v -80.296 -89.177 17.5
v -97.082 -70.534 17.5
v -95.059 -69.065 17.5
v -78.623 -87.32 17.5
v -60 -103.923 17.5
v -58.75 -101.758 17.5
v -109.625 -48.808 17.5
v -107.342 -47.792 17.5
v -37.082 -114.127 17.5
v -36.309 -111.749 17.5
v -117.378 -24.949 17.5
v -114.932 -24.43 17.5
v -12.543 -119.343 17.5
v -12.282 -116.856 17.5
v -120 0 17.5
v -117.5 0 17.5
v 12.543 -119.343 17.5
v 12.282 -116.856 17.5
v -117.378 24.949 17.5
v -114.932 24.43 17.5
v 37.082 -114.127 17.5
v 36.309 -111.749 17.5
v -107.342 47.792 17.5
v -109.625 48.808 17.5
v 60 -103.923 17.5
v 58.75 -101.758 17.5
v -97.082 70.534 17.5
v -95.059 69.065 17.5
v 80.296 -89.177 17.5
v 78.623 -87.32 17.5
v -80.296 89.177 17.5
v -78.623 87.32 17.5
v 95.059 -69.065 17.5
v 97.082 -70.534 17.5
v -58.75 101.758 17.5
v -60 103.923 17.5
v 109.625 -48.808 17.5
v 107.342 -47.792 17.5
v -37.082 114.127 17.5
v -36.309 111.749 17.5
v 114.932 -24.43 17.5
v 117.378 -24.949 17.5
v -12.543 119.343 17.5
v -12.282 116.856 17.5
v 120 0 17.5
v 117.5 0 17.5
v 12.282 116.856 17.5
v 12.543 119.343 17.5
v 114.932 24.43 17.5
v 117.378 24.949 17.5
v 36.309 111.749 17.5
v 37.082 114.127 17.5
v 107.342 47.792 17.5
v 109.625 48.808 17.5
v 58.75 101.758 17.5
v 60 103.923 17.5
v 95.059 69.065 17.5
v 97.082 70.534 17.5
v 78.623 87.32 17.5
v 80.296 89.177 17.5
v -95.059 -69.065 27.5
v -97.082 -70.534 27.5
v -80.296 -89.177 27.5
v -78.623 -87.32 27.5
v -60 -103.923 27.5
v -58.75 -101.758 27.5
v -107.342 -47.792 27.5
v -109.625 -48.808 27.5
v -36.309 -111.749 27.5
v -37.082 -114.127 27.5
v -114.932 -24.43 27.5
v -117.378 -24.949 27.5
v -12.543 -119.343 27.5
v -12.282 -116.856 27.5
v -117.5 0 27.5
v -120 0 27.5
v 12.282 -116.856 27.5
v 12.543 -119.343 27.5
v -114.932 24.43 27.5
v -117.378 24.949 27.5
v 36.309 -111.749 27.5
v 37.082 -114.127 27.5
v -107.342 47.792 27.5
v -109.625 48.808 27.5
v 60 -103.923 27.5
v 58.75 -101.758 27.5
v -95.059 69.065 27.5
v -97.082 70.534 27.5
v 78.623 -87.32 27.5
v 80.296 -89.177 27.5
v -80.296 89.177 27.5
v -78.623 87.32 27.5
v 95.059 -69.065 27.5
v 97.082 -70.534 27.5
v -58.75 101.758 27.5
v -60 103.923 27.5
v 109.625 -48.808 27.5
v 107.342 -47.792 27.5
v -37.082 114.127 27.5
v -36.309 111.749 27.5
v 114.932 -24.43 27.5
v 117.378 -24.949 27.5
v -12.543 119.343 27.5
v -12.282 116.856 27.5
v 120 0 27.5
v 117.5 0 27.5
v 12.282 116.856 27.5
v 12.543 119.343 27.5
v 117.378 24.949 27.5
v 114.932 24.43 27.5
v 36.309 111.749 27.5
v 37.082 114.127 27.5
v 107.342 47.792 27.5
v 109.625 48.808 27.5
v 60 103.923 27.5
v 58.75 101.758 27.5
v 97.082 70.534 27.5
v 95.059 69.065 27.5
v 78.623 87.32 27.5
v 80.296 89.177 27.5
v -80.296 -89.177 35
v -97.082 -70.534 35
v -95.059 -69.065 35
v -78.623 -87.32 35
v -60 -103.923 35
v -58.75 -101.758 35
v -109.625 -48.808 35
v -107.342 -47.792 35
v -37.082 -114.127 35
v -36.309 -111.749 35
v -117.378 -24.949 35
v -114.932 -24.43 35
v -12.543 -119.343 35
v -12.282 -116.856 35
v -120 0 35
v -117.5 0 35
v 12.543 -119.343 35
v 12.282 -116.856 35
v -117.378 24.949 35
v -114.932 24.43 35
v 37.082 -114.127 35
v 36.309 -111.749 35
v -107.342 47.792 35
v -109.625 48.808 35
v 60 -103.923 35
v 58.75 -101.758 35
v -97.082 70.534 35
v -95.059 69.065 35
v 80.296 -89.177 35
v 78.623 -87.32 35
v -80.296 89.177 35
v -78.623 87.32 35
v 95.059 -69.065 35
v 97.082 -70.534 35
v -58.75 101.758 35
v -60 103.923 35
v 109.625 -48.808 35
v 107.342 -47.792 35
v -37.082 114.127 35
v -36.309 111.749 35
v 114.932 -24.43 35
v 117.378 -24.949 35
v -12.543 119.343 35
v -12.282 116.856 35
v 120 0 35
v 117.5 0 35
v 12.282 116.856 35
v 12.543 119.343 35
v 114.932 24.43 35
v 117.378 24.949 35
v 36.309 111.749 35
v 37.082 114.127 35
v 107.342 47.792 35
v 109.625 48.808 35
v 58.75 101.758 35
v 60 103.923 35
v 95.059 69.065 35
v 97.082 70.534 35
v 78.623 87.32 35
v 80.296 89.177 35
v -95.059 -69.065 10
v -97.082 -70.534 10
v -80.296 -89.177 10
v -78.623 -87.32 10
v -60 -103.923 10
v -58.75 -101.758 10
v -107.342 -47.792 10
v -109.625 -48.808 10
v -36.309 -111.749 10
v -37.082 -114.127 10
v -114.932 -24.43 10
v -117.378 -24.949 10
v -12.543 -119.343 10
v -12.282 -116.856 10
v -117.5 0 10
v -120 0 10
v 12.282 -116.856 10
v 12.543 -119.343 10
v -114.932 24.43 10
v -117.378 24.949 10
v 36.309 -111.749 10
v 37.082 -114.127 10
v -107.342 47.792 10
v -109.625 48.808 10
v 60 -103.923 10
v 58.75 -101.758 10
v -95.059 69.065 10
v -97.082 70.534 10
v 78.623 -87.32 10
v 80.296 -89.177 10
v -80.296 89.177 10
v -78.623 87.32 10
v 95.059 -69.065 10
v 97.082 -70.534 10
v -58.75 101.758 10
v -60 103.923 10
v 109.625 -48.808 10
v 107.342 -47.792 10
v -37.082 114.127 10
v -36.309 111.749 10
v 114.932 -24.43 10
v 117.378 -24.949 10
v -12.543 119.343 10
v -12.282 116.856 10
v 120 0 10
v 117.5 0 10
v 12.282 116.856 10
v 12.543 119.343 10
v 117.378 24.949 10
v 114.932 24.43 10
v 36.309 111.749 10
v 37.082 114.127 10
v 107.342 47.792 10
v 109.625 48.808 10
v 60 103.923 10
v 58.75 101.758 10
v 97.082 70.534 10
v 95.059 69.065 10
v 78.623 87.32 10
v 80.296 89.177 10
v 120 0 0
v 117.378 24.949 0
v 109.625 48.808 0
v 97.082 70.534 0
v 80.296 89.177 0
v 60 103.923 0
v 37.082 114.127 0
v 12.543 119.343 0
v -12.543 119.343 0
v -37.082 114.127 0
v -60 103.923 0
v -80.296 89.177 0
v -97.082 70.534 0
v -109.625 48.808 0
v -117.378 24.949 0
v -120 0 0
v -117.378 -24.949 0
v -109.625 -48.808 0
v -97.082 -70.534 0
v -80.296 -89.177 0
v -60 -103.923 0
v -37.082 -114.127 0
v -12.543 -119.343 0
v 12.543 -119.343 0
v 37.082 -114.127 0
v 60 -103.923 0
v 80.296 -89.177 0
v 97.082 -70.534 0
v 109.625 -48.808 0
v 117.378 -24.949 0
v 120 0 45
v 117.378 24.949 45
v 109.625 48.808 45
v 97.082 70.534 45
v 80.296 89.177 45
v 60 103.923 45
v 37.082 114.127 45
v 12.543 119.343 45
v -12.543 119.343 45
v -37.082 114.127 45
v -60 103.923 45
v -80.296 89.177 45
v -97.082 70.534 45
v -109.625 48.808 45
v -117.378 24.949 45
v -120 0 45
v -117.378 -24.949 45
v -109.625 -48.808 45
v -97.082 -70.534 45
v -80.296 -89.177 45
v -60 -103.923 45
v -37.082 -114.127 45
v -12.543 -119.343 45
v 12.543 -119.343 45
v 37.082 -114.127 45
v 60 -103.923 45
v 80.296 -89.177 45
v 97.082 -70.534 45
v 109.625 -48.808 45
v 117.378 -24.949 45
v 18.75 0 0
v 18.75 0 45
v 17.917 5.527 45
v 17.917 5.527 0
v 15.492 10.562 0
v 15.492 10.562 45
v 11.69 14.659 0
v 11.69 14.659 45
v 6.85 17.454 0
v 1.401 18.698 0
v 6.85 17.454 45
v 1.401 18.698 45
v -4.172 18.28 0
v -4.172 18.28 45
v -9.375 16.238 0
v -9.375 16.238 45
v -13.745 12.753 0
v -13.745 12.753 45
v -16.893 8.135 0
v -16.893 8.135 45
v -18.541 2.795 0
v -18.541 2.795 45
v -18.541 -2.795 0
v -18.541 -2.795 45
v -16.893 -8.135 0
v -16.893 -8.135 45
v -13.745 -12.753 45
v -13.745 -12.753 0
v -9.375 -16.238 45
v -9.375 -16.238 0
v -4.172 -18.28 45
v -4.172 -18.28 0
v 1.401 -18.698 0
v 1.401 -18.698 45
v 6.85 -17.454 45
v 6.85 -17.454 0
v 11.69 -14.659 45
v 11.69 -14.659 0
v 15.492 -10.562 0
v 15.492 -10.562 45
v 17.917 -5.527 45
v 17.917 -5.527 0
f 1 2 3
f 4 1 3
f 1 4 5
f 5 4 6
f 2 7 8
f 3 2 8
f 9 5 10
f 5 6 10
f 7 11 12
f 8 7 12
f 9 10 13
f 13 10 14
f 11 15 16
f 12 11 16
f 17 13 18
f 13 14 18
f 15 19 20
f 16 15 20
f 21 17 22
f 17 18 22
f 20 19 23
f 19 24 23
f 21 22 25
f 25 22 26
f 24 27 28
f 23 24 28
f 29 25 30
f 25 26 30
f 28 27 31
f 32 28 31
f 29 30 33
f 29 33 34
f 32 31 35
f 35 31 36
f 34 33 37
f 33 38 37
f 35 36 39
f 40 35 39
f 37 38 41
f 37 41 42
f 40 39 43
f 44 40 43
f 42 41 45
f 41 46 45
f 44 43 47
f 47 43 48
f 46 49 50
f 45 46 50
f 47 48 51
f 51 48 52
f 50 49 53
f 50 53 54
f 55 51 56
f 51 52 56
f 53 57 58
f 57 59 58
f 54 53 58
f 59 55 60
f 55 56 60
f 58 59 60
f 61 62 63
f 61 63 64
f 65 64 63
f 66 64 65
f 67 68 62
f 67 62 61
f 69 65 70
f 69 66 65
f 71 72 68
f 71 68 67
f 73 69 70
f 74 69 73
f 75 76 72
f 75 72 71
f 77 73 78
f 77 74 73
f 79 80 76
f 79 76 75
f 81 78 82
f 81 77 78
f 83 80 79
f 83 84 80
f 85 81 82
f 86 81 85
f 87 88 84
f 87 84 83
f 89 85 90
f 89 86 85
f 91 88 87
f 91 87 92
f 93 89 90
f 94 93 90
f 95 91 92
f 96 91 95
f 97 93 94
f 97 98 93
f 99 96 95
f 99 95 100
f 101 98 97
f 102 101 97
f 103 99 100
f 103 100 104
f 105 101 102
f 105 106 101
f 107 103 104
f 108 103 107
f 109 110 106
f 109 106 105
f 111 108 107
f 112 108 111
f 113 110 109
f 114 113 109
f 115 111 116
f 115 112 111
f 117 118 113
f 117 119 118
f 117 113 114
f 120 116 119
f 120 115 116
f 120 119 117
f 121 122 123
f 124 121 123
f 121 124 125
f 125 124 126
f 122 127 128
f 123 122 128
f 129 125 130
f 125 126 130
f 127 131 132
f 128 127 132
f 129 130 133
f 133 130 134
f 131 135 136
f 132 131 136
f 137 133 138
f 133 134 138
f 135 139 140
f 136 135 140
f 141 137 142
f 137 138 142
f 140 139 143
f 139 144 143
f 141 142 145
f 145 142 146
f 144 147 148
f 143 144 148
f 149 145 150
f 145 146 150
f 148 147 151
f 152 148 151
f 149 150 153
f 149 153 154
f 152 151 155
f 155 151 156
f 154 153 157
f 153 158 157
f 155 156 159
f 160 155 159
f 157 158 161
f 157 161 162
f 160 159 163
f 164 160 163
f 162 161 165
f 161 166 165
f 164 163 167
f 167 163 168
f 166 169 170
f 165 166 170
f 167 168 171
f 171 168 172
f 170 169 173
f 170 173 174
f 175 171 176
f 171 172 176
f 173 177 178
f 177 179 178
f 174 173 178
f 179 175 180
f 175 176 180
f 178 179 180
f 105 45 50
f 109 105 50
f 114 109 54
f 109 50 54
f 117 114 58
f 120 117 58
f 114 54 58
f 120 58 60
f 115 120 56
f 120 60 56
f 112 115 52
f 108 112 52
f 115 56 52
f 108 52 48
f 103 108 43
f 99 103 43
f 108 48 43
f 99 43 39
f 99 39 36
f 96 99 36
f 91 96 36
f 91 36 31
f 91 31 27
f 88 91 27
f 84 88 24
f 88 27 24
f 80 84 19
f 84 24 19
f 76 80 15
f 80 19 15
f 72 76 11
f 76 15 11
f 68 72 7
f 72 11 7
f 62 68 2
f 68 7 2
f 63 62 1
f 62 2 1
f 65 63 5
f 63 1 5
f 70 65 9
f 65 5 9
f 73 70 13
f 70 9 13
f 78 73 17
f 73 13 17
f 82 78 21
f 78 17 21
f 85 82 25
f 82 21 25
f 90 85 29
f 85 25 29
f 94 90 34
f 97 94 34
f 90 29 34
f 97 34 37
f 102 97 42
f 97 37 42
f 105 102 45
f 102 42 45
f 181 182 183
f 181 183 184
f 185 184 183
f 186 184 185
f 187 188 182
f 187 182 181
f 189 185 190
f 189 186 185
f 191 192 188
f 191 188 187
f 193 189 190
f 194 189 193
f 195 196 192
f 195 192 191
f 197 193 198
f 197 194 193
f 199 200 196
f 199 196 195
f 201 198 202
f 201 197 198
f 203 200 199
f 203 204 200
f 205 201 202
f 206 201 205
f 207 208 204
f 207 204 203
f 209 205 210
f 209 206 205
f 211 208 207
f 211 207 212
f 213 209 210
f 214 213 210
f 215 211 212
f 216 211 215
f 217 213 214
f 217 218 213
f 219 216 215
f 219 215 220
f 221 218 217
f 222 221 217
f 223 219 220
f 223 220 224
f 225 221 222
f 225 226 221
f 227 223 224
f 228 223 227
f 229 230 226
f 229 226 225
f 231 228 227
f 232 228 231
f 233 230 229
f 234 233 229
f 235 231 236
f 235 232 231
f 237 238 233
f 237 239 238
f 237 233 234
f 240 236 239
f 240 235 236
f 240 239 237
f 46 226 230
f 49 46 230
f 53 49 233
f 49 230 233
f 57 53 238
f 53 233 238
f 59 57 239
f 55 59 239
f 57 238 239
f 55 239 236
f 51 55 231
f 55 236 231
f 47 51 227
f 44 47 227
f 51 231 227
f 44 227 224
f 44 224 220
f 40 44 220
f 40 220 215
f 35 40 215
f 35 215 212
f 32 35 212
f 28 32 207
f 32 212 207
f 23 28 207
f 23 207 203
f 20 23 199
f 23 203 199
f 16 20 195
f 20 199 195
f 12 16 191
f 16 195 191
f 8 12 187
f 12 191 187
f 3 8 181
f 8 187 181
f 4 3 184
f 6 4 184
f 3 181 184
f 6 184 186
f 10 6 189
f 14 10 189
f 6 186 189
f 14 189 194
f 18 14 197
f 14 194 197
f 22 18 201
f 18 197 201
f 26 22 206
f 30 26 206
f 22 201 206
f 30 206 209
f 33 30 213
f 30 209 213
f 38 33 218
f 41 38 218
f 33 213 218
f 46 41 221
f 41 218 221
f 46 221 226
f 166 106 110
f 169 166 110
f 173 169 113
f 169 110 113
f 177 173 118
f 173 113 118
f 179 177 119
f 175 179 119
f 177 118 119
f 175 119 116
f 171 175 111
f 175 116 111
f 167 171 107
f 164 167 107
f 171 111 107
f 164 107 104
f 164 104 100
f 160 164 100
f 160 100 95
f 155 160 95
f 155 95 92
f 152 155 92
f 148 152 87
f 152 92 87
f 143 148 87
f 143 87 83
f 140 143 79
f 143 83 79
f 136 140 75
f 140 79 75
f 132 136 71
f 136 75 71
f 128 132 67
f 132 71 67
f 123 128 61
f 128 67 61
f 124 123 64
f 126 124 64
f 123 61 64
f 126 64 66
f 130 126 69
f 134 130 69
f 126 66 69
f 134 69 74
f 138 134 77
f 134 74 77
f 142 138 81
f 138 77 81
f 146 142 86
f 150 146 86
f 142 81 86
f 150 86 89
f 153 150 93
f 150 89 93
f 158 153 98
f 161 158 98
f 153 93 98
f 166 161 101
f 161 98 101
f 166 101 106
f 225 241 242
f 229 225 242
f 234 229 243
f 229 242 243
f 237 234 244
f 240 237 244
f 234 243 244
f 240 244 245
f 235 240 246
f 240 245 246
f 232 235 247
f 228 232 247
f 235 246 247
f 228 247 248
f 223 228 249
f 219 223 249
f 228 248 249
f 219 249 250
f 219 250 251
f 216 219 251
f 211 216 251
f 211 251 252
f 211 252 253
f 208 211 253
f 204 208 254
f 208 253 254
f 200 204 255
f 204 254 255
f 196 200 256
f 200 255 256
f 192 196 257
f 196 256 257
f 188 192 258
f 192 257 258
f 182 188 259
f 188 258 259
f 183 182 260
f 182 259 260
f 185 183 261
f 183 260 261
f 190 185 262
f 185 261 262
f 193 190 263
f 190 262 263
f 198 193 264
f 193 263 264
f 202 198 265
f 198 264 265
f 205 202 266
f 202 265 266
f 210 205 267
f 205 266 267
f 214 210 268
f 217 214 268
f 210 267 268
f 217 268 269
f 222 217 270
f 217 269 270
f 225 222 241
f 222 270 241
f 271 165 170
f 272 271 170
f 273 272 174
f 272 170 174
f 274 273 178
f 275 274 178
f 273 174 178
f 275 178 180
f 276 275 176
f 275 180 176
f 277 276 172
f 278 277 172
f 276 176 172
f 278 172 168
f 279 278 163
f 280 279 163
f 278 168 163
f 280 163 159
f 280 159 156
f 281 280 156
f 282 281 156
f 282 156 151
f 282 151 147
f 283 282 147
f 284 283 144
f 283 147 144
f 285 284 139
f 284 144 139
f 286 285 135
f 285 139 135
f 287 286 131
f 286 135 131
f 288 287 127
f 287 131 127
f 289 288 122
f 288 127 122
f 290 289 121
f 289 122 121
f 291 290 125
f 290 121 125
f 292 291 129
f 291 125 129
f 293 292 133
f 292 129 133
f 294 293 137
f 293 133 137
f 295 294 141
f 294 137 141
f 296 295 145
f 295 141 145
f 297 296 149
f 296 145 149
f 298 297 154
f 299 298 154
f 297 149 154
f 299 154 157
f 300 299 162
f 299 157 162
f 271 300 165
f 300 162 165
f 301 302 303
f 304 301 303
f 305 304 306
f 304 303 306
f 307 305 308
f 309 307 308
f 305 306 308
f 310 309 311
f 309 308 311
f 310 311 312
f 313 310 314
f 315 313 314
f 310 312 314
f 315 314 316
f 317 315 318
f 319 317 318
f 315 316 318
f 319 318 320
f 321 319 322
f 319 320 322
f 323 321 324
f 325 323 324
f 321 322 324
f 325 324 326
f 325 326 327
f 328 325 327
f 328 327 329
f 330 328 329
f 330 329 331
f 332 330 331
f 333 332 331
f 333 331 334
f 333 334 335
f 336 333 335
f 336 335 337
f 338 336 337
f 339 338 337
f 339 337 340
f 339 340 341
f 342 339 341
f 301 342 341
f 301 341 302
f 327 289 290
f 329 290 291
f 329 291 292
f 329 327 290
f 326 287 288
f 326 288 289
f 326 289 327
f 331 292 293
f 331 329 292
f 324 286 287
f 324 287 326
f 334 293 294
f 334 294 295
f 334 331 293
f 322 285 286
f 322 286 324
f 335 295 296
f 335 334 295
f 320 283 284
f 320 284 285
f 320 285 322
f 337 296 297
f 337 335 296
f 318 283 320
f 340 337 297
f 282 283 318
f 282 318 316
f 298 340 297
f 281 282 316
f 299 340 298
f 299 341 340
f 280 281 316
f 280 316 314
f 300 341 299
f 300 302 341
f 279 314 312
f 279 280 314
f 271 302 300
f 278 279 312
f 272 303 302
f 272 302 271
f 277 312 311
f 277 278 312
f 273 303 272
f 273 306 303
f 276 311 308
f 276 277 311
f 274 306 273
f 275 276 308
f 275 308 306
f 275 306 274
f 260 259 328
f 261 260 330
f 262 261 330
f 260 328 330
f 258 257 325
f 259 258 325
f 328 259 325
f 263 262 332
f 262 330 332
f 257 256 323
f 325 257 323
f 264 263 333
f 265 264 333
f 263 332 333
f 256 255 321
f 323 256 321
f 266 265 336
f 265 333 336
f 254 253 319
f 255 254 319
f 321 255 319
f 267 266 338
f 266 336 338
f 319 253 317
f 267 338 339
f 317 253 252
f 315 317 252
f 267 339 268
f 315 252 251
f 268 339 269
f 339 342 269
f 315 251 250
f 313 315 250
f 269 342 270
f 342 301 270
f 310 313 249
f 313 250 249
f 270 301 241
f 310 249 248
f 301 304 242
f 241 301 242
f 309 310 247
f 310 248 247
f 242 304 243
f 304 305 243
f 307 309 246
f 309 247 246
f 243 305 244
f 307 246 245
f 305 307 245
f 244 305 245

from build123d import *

# Parameters (mm, degrees)
SKETCH1_R           = 120
BOSS_EXTRUDE2_DEPTH = 10
SKETCH2_R           = 117.5
BOSS_EXTRUDE3_DEPTH = 7.5
SKETCH3_R           = 120
BOSS_EXTRUDE4_DEPTH = 10
SKETCH4_R           = 117.5
BOSS_EXTRUDE5_DEPTH = 7.5
SKETCH5_R           = 120
BOSS_EXTRUDE6_DEPTH = 10
SKETCH6_R           = 18.75
CUT_EXTRUDE1_DEPTH  = 50


with BuildPart() as part:
    # Sketch1 → Boss-Extrude2 (new body)
    with BuildSketch(Plane.XY):
        Circle(SKETCH1_R)
    extrude(amount=BOSS_EXTRUDE2_DEPTH)

    # Sketch2 → Boss-Extrude3 (add)
    with BuildSketch(Plane.XY.offset(10)):
        Circle(SKETCH2_R)
    extrude(amount=BOSS_EXTRUDE3_DEPTH)

    # Sketch3 → Boss-Extrude4 (add)
    with BuildSketch(Plane.XY.offset(17.5)):
        Circle(SKETCH3_R)
    extrude(amount=BOSS_EXTRUDE4_DEPTH)

    # Sketch4 → Boss-Extrude5 (add)
    with BuildSketch(Plane.XY.offset(27.5)):
        Circle(SKETCH4_R)
    extrude(amount=BOSS_EXTRUDE5_DEPTH)

    # Sketch5 → Boss-Extrude6 (add)
    with BuildSketch(Plane.XY.offset(35)):
        Circle(SKETCH5_R)
    extrude(amount=BOSS_EXTRUDE6_DEPTH)

    # Sketch6 → Cut-Extrude1 (cut)
    with BuildSketch(Plane.XY.offset(45)):
        Circle(SKETCH6_R)
    extrude(amount=-CUT_EXTRUDE1_DEPTH, mode=Mode.SUBTRACT)


solid = part.part
